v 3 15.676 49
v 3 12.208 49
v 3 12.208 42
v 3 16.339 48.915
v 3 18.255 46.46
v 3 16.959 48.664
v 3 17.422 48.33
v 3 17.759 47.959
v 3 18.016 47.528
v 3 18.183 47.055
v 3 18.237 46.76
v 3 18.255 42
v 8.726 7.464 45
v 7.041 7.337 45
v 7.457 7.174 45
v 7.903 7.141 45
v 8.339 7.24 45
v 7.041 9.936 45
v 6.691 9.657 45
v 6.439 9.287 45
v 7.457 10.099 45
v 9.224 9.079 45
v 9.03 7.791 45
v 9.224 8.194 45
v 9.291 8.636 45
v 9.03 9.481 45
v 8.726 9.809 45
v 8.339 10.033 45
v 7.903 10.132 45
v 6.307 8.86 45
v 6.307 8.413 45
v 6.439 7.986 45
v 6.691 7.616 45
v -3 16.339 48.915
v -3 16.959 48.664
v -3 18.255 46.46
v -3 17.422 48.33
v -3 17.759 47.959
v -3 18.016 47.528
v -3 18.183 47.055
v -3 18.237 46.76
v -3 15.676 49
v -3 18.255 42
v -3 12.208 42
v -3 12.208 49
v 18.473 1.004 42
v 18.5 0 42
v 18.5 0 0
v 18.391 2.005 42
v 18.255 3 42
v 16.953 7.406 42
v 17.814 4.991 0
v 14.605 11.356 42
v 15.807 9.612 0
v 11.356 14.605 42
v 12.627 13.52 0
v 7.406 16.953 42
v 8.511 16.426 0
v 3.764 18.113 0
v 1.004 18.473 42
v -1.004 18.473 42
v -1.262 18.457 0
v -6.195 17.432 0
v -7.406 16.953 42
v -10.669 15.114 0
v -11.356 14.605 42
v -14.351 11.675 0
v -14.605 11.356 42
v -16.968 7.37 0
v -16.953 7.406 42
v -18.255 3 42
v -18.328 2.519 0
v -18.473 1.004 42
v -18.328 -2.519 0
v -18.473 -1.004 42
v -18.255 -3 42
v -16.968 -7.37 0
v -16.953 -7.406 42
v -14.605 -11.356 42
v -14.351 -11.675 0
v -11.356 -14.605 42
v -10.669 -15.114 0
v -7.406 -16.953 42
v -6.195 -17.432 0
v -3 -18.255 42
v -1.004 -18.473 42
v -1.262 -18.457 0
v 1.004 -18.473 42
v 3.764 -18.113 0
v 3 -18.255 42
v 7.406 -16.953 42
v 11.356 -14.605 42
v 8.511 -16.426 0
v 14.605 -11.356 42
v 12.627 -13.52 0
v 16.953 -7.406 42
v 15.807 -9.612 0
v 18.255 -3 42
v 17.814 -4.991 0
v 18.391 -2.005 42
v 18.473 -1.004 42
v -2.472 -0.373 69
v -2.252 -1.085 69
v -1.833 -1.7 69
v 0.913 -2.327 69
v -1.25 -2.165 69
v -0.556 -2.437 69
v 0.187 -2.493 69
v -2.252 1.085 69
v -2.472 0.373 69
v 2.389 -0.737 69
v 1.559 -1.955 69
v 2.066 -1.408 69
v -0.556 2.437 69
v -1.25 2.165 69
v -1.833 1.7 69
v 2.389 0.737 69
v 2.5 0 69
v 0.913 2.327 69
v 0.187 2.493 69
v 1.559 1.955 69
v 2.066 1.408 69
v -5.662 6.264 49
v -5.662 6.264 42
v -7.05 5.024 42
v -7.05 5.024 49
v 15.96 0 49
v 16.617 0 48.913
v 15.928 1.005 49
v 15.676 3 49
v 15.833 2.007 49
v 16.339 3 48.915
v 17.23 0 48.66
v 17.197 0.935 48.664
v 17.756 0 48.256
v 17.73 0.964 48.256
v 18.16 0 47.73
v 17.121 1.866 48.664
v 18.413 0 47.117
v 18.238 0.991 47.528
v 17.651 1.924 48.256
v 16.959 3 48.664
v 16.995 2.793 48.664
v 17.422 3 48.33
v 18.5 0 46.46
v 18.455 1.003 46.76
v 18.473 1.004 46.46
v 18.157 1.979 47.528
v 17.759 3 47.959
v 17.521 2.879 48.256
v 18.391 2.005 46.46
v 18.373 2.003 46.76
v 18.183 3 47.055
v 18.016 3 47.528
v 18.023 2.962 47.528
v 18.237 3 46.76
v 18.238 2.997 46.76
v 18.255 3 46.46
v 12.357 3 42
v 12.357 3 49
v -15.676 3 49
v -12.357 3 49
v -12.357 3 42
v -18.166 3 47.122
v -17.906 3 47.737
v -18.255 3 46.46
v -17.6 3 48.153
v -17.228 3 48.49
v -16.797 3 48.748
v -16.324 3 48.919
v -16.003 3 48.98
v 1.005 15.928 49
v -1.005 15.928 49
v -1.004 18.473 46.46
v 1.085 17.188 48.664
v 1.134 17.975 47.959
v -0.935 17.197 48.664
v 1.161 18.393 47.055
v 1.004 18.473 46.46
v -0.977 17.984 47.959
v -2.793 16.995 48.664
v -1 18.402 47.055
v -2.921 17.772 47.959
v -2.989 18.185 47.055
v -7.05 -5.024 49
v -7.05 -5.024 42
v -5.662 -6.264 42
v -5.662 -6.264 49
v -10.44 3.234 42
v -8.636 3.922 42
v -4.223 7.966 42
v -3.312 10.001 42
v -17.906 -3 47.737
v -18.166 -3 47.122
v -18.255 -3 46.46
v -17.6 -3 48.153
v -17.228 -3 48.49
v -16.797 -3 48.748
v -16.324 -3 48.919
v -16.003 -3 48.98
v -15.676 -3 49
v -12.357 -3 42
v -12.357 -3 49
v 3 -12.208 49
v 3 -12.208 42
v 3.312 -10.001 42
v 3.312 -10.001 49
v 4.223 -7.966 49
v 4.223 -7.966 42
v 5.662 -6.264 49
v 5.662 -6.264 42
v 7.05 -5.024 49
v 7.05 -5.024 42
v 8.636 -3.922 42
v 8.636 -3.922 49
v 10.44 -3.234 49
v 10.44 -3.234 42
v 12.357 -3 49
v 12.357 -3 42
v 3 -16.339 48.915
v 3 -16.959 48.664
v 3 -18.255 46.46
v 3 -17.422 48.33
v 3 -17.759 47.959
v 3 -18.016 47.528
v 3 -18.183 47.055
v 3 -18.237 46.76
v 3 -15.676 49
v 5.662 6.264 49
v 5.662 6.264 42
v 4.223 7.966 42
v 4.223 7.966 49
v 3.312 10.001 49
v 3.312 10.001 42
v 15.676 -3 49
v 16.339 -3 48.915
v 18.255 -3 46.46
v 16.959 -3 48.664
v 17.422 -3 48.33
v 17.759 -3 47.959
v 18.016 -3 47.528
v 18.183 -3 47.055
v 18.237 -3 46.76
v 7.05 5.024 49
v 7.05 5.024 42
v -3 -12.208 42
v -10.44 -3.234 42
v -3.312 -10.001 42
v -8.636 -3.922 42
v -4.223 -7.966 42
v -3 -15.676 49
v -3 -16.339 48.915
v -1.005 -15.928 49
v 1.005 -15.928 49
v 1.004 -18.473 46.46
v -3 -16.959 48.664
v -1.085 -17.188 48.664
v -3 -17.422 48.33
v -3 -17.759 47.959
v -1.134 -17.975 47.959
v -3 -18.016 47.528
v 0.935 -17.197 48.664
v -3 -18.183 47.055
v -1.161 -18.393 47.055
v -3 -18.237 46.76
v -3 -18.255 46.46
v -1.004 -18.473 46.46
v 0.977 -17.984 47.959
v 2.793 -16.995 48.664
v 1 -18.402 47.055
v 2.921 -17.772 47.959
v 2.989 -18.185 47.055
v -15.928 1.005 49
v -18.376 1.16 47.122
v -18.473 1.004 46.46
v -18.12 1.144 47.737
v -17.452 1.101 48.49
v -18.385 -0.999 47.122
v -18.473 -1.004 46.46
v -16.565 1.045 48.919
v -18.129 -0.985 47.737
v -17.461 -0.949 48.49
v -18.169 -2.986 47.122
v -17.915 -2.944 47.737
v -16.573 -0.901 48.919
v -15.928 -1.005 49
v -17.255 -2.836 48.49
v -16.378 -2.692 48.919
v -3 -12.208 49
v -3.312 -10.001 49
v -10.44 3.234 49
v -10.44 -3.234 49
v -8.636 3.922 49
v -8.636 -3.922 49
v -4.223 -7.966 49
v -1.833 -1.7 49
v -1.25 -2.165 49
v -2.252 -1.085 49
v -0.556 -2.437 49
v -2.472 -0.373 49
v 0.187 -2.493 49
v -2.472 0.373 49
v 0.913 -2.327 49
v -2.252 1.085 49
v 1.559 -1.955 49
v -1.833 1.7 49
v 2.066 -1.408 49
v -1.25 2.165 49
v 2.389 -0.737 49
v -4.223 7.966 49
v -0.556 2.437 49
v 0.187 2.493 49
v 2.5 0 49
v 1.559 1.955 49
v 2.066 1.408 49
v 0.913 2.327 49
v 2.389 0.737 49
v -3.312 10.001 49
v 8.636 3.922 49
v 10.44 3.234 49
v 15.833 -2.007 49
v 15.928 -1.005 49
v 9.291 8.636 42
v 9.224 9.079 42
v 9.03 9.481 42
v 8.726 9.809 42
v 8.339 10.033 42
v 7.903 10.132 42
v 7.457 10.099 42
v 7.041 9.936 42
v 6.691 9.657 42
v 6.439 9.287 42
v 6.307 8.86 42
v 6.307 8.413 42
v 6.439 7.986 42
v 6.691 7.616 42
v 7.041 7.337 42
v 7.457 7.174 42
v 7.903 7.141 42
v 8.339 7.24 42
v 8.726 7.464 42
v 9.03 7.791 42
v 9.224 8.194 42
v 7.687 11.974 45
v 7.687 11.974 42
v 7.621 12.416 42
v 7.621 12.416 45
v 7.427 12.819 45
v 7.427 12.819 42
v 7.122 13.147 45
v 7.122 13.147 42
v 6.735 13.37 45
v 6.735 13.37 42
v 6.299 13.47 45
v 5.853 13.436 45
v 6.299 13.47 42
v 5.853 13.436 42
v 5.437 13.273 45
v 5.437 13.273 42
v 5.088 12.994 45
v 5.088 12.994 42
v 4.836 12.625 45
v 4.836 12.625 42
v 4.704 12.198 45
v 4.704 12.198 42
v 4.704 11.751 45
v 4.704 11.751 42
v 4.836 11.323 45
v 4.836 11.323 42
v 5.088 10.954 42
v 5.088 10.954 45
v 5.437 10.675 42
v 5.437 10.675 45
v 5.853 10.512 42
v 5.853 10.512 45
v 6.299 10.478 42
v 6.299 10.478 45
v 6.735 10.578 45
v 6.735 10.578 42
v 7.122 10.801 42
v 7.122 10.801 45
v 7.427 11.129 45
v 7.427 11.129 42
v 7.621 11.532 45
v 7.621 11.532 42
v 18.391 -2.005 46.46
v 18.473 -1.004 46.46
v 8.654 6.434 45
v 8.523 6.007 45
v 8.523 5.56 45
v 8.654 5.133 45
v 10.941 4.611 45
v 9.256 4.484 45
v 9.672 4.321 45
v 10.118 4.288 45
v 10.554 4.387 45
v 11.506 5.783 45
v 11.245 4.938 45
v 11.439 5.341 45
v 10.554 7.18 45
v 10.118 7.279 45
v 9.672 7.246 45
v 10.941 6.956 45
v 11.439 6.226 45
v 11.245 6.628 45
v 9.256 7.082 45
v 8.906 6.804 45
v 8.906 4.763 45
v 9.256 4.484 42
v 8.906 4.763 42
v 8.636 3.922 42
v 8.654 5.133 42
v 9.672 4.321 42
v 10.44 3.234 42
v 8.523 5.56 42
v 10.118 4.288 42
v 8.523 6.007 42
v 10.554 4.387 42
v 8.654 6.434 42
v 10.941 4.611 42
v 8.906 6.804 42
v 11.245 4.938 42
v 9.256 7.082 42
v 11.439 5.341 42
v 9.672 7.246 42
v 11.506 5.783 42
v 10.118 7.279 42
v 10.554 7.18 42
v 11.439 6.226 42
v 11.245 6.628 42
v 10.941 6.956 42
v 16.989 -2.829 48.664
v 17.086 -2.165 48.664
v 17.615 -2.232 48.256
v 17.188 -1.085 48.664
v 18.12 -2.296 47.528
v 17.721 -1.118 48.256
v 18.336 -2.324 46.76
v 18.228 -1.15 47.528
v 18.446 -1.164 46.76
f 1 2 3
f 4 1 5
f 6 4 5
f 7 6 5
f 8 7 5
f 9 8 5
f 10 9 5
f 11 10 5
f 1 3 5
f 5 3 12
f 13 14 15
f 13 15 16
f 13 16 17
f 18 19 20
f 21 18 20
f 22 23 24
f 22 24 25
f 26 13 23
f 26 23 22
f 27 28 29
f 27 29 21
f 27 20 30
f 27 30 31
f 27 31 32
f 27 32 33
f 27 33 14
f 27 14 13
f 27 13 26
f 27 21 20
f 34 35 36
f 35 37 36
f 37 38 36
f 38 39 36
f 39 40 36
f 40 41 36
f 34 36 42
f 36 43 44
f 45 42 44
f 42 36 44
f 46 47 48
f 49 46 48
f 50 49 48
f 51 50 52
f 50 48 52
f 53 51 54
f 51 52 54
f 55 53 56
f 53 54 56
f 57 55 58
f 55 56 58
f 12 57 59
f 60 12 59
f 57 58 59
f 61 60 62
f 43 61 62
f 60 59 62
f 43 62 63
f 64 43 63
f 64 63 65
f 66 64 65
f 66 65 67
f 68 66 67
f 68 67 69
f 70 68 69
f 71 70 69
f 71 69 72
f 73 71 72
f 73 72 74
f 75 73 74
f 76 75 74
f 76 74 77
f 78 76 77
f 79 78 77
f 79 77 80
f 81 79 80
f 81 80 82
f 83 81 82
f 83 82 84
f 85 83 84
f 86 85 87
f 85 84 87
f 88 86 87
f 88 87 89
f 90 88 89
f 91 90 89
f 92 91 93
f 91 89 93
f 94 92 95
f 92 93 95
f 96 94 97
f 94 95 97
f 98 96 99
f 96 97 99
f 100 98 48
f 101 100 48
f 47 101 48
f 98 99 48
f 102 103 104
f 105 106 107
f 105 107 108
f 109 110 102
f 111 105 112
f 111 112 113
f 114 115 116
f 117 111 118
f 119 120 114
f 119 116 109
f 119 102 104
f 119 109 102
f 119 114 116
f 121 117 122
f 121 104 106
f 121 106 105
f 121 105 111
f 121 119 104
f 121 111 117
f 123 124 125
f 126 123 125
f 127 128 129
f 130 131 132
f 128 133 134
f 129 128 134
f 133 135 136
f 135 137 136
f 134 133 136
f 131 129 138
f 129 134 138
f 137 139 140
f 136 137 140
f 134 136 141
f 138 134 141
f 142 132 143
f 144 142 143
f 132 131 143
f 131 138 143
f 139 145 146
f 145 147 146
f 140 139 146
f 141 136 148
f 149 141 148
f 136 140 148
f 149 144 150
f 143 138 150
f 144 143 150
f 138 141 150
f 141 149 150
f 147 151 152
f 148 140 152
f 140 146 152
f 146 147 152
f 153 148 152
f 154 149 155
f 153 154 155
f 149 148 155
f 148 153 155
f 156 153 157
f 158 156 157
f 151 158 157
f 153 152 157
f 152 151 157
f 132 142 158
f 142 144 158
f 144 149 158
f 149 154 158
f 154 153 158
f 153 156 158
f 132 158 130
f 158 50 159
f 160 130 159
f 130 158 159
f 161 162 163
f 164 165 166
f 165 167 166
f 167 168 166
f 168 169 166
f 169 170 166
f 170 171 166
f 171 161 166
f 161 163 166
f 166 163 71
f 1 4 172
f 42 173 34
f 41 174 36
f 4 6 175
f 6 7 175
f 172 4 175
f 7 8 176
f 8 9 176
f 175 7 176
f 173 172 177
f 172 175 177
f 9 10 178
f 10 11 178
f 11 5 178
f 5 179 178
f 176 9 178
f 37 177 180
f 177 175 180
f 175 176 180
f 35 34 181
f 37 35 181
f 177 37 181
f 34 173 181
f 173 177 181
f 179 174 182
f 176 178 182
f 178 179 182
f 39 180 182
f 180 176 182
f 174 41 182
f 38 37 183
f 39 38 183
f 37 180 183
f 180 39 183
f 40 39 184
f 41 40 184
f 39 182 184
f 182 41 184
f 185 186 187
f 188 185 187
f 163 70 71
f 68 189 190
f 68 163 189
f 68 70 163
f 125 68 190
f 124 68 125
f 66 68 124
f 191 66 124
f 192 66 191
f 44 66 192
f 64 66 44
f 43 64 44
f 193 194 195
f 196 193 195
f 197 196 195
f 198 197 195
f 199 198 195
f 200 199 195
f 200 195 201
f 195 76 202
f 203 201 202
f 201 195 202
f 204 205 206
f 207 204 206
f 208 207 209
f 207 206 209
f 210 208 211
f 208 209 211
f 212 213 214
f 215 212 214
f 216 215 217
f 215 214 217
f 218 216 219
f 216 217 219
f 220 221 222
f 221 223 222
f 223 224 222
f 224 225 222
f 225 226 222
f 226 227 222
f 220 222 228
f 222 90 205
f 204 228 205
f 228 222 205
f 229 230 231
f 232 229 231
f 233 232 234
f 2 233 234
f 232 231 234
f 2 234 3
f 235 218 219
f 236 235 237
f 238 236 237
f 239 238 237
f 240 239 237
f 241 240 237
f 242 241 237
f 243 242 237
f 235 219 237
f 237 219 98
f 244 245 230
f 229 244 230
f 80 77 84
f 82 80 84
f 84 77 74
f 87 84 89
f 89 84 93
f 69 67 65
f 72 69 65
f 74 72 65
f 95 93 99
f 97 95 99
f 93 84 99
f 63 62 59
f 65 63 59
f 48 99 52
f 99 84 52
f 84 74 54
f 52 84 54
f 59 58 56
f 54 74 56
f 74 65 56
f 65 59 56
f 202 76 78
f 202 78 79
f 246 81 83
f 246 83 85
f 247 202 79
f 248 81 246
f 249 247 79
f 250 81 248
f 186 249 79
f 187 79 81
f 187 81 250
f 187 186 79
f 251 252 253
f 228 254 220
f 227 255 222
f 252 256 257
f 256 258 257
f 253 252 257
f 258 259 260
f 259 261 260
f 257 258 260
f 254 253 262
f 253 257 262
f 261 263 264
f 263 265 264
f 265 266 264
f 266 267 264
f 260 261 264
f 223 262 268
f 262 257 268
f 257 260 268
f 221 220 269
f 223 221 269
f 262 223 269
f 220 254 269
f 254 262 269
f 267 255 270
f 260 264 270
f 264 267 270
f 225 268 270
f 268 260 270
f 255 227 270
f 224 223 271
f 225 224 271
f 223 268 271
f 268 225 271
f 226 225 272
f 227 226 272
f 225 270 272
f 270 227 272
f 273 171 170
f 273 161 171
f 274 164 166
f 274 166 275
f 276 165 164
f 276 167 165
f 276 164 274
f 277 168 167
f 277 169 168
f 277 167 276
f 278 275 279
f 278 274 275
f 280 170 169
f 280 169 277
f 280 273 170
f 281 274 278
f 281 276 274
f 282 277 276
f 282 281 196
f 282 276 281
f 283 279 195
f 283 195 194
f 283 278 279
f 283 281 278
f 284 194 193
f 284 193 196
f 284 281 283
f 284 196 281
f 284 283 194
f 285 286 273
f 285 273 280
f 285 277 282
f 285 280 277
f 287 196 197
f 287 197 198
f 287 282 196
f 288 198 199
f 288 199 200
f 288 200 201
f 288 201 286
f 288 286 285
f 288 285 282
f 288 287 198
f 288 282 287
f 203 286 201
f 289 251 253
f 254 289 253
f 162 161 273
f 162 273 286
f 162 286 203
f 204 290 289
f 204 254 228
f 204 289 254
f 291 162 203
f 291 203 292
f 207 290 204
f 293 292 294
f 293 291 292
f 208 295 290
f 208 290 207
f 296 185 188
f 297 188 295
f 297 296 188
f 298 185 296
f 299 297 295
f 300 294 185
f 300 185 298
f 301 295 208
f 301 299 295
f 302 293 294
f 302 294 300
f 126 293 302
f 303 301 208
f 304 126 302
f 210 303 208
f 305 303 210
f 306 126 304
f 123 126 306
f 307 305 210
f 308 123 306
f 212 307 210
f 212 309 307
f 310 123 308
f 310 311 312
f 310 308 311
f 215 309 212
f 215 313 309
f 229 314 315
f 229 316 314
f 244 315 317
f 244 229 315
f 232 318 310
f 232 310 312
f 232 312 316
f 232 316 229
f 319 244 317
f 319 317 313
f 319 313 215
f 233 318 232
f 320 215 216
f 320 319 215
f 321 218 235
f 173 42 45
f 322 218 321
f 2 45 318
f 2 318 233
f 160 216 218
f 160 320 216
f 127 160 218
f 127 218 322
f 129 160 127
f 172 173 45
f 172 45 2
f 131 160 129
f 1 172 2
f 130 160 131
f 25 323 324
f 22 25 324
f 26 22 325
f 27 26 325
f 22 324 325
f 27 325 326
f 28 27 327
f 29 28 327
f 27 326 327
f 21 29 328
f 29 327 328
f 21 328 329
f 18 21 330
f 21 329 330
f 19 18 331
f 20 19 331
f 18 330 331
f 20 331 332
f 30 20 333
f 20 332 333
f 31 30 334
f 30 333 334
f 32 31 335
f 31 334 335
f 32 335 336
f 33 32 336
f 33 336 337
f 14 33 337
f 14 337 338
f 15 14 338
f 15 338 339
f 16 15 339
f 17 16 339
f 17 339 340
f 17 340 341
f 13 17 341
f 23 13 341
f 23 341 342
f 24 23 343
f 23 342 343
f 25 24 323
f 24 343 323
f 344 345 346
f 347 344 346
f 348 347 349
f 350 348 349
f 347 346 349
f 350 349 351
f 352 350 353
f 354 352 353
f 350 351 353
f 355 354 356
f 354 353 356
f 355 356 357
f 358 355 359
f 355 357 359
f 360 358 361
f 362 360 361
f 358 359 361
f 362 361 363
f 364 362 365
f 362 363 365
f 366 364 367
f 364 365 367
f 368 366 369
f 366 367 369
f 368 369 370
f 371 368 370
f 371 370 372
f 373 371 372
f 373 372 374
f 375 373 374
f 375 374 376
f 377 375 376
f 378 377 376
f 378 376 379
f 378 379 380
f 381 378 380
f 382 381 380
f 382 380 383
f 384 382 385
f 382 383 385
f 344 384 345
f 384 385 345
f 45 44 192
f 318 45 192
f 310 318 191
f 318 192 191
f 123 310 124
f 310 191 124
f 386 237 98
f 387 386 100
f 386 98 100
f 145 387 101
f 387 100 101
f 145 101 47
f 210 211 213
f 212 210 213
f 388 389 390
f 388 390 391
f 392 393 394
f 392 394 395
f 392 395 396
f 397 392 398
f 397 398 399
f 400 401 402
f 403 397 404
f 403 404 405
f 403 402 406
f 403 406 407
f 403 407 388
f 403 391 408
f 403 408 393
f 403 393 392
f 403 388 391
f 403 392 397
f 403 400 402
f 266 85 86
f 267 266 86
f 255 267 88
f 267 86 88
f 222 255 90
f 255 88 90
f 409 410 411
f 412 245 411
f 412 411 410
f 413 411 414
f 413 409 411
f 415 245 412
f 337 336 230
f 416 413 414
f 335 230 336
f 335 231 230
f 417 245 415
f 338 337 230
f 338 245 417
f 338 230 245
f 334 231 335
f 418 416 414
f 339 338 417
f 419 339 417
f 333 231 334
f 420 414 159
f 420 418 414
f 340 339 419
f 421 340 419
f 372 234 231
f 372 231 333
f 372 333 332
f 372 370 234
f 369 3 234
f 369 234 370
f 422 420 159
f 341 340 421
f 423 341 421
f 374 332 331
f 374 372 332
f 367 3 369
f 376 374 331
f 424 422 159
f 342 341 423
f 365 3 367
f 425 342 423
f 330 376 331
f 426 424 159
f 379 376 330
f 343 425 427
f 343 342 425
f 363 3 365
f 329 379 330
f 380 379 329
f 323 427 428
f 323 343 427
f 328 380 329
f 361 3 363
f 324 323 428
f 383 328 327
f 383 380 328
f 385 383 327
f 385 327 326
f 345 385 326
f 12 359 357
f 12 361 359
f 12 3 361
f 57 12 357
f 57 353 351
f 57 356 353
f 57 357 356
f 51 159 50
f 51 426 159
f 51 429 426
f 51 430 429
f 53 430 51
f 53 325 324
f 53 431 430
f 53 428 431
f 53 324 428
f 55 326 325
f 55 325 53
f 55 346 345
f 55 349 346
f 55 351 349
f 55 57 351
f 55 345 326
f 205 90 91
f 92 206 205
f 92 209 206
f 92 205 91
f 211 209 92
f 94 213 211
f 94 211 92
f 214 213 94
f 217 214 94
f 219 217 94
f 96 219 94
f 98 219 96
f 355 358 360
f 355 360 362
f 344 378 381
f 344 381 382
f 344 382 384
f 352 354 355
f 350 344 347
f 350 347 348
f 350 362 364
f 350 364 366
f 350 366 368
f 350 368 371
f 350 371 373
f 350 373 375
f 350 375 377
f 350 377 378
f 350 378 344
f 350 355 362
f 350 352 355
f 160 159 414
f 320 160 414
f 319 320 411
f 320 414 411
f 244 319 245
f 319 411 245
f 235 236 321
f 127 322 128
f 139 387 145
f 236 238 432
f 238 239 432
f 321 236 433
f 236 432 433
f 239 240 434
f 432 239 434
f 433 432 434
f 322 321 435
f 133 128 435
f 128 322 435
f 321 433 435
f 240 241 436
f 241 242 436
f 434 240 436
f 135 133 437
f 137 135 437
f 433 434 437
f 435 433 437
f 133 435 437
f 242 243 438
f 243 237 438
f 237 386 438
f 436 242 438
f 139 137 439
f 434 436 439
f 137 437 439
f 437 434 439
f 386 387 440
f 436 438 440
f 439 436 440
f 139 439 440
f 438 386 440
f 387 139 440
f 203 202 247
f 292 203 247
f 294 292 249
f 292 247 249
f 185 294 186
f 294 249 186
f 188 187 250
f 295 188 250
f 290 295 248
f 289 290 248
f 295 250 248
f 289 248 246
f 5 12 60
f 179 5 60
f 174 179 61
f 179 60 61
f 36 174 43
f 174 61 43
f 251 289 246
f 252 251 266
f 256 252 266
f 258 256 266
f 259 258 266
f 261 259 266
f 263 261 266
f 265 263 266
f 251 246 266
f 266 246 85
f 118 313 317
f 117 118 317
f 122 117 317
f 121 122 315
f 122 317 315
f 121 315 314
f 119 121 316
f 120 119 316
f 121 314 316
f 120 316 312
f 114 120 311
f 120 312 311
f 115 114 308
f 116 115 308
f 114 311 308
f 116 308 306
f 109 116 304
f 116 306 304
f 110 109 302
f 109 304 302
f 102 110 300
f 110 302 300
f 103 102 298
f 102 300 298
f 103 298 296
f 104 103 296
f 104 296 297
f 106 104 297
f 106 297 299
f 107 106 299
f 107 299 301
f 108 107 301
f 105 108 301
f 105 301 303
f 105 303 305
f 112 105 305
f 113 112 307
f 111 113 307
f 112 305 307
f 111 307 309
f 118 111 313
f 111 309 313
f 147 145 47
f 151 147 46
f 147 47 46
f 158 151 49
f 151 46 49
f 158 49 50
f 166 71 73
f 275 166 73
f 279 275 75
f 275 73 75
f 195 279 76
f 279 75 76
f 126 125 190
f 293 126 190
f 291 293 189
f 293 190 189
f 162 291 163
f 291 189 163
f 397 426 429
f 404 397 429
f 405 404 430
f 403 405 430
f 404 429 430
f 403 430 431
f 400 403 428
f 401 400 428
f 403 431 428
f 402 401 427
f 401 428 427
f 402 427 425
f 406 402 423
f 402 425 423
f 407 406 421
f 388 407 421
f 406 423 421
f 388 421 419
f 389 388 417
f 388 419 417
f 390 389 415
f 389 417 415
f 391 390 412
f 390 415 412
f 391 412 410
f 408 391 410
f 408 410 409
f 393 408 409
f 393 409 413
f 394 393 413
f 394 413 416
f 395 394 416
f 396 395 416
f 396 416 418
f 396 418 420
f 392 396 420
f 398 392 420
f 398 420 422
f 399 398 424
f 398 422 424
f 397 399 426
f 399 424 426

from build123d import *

# Parameters (mm, degrees)
F0_R     = 18.5
F1_DEPTH = 42
F3_DEPTH = 7
F4_R     = 2.54
F5_R     = 2.5
F6_DEPTH = 20
F8_R     = 1.5
F7_R     = 1.5
F9_DEPTH = 3


with BuildPart() as f1:
    # F0 (on Top) → F1 (new body)
    with BuildSketch(Plane.XY):
        Circle(F0_R)
    extrude(amount=F1_DEPTH)

    # F2 (on face) → F3 (join)
    with BuildSketch(Plane.XY.offset(42)):
        with BuildLine():
            ThreePointArc((-18.2551362635, 3), (-18.5, 0), (-18.2551362635, -3))
            Line((-18.2551362635, -3), (-12.357306623, -3))
            ThreePointArc((-12.357306623, -3), (-9.5173301957, -3.5232332201), (-7.0502937278, -5.0242229525))
            Line((-7.0502937278, -5.0242229525), (-5.6619374598, -6.2636447322))
            ThreePointArc((-5.6619374598, -6.2636447322), (-3.695866688, -8.9516216481), (-3, -12.2083721348))
            Line((-3, -12.2083721348), (-3, -18.2551362635))
            ThreePointArc((-3, -18.2551362635), (0, -18.5), (3, -18.2551362635))
            Line((3, -18.2551362635), (3, -12.2083721348))
            ThreePointArc((3, -12.2083721348), (3.695866688, -8.9516216481), (5.6619374598, -6.2636447322))
            Line((5.6619374598, -6.2636447322), (7.0502937278, -5.0242229525))
            ThreePointArc((7.0502937278, -5.0242229525), (9.5173301957, -3.5232332201), (12.357306623, -3))
            Line((12.357306623, -3), (18.2551362635, -3))
            ThreePointArc((18.2551362635, -3), (18.4386824485, -1.5049882267), (18.5, 0))
            ThreePointArc((18.5, 0), (18.4386824485, 1.5049882267), (18.2551362635, 3))
            Line((18.2551362635, 3), (12.357306623, 3))
            ThreePointArc((12.357306623, 3), (9.5173301957, 3.5232332201), (7.0502937278, 5.0242229525))
            Line((7.0502937278, 5.0242229525), (5.6619374598, 6.2636447322))
            ThreePointArc((5.6619374598, 6.2636447322), (3.695866688, 8.9516216481), (3, 12.2083721348))
            Line((3, 12.2083721348), (3, 18.2551362635))
            ThreePointArc((3, 18.2551362635), (0, 18.5), (-3, 18.2551362635))
            Line((-3, 18.2551362635), (-3, 12.2083721348))
            ThreePointArc((-3, 12.2083721348), (-3.695866688, 8.9516216481), (-5.6619374598, 6.2636447322))
            Line((-5.6619374598, 6.2636447322), (-7.0502937278, 5.0242229525))
            ThreePointArc((-7.0502937278, 5.0242229525), (-9.5173301957, 3.5232332201), (-12.357306623, 3))
            Line((-12.357306623, 3), (-18.2551362635, 3))
        make_face()
    extrude(amount=F3_DEPTH)

    # F4
    f4_edges = [f1.edges().sort_by_distance(p)[0] for p in [
        (0, 18.5, 49),
        (-18.5, 0, 49),
        (0, -18.5, 49),
        (18.5, 0, 49),
    ]]
    fillet(f4_edges, radius=F4_R)

    # F5 (on face) → F6 (join)
    with BuildSketch(Plane.XY.offset(49)):
        Circle(F5_R)
    extrude(amount=F6_DEPTH)

    # F8 (on face) + F7 (on face) → F9 (join)
    with BuildSketch(Plane.XY.offset(42)):
        with Locations((6.1871920723, 11.9740978757)):
            Circle(F8_R)
    with BuildSketch(Plane.XY.offset(42)):
        with Locations((7.7906422209, 8.6364694748)):
            Circle(F7_R)
        with Locations((10.0058761309, 5.7833763727)):
            Circle(F7_R)
    extrude(amount=F9_DEPTH)


solid = f1.part
